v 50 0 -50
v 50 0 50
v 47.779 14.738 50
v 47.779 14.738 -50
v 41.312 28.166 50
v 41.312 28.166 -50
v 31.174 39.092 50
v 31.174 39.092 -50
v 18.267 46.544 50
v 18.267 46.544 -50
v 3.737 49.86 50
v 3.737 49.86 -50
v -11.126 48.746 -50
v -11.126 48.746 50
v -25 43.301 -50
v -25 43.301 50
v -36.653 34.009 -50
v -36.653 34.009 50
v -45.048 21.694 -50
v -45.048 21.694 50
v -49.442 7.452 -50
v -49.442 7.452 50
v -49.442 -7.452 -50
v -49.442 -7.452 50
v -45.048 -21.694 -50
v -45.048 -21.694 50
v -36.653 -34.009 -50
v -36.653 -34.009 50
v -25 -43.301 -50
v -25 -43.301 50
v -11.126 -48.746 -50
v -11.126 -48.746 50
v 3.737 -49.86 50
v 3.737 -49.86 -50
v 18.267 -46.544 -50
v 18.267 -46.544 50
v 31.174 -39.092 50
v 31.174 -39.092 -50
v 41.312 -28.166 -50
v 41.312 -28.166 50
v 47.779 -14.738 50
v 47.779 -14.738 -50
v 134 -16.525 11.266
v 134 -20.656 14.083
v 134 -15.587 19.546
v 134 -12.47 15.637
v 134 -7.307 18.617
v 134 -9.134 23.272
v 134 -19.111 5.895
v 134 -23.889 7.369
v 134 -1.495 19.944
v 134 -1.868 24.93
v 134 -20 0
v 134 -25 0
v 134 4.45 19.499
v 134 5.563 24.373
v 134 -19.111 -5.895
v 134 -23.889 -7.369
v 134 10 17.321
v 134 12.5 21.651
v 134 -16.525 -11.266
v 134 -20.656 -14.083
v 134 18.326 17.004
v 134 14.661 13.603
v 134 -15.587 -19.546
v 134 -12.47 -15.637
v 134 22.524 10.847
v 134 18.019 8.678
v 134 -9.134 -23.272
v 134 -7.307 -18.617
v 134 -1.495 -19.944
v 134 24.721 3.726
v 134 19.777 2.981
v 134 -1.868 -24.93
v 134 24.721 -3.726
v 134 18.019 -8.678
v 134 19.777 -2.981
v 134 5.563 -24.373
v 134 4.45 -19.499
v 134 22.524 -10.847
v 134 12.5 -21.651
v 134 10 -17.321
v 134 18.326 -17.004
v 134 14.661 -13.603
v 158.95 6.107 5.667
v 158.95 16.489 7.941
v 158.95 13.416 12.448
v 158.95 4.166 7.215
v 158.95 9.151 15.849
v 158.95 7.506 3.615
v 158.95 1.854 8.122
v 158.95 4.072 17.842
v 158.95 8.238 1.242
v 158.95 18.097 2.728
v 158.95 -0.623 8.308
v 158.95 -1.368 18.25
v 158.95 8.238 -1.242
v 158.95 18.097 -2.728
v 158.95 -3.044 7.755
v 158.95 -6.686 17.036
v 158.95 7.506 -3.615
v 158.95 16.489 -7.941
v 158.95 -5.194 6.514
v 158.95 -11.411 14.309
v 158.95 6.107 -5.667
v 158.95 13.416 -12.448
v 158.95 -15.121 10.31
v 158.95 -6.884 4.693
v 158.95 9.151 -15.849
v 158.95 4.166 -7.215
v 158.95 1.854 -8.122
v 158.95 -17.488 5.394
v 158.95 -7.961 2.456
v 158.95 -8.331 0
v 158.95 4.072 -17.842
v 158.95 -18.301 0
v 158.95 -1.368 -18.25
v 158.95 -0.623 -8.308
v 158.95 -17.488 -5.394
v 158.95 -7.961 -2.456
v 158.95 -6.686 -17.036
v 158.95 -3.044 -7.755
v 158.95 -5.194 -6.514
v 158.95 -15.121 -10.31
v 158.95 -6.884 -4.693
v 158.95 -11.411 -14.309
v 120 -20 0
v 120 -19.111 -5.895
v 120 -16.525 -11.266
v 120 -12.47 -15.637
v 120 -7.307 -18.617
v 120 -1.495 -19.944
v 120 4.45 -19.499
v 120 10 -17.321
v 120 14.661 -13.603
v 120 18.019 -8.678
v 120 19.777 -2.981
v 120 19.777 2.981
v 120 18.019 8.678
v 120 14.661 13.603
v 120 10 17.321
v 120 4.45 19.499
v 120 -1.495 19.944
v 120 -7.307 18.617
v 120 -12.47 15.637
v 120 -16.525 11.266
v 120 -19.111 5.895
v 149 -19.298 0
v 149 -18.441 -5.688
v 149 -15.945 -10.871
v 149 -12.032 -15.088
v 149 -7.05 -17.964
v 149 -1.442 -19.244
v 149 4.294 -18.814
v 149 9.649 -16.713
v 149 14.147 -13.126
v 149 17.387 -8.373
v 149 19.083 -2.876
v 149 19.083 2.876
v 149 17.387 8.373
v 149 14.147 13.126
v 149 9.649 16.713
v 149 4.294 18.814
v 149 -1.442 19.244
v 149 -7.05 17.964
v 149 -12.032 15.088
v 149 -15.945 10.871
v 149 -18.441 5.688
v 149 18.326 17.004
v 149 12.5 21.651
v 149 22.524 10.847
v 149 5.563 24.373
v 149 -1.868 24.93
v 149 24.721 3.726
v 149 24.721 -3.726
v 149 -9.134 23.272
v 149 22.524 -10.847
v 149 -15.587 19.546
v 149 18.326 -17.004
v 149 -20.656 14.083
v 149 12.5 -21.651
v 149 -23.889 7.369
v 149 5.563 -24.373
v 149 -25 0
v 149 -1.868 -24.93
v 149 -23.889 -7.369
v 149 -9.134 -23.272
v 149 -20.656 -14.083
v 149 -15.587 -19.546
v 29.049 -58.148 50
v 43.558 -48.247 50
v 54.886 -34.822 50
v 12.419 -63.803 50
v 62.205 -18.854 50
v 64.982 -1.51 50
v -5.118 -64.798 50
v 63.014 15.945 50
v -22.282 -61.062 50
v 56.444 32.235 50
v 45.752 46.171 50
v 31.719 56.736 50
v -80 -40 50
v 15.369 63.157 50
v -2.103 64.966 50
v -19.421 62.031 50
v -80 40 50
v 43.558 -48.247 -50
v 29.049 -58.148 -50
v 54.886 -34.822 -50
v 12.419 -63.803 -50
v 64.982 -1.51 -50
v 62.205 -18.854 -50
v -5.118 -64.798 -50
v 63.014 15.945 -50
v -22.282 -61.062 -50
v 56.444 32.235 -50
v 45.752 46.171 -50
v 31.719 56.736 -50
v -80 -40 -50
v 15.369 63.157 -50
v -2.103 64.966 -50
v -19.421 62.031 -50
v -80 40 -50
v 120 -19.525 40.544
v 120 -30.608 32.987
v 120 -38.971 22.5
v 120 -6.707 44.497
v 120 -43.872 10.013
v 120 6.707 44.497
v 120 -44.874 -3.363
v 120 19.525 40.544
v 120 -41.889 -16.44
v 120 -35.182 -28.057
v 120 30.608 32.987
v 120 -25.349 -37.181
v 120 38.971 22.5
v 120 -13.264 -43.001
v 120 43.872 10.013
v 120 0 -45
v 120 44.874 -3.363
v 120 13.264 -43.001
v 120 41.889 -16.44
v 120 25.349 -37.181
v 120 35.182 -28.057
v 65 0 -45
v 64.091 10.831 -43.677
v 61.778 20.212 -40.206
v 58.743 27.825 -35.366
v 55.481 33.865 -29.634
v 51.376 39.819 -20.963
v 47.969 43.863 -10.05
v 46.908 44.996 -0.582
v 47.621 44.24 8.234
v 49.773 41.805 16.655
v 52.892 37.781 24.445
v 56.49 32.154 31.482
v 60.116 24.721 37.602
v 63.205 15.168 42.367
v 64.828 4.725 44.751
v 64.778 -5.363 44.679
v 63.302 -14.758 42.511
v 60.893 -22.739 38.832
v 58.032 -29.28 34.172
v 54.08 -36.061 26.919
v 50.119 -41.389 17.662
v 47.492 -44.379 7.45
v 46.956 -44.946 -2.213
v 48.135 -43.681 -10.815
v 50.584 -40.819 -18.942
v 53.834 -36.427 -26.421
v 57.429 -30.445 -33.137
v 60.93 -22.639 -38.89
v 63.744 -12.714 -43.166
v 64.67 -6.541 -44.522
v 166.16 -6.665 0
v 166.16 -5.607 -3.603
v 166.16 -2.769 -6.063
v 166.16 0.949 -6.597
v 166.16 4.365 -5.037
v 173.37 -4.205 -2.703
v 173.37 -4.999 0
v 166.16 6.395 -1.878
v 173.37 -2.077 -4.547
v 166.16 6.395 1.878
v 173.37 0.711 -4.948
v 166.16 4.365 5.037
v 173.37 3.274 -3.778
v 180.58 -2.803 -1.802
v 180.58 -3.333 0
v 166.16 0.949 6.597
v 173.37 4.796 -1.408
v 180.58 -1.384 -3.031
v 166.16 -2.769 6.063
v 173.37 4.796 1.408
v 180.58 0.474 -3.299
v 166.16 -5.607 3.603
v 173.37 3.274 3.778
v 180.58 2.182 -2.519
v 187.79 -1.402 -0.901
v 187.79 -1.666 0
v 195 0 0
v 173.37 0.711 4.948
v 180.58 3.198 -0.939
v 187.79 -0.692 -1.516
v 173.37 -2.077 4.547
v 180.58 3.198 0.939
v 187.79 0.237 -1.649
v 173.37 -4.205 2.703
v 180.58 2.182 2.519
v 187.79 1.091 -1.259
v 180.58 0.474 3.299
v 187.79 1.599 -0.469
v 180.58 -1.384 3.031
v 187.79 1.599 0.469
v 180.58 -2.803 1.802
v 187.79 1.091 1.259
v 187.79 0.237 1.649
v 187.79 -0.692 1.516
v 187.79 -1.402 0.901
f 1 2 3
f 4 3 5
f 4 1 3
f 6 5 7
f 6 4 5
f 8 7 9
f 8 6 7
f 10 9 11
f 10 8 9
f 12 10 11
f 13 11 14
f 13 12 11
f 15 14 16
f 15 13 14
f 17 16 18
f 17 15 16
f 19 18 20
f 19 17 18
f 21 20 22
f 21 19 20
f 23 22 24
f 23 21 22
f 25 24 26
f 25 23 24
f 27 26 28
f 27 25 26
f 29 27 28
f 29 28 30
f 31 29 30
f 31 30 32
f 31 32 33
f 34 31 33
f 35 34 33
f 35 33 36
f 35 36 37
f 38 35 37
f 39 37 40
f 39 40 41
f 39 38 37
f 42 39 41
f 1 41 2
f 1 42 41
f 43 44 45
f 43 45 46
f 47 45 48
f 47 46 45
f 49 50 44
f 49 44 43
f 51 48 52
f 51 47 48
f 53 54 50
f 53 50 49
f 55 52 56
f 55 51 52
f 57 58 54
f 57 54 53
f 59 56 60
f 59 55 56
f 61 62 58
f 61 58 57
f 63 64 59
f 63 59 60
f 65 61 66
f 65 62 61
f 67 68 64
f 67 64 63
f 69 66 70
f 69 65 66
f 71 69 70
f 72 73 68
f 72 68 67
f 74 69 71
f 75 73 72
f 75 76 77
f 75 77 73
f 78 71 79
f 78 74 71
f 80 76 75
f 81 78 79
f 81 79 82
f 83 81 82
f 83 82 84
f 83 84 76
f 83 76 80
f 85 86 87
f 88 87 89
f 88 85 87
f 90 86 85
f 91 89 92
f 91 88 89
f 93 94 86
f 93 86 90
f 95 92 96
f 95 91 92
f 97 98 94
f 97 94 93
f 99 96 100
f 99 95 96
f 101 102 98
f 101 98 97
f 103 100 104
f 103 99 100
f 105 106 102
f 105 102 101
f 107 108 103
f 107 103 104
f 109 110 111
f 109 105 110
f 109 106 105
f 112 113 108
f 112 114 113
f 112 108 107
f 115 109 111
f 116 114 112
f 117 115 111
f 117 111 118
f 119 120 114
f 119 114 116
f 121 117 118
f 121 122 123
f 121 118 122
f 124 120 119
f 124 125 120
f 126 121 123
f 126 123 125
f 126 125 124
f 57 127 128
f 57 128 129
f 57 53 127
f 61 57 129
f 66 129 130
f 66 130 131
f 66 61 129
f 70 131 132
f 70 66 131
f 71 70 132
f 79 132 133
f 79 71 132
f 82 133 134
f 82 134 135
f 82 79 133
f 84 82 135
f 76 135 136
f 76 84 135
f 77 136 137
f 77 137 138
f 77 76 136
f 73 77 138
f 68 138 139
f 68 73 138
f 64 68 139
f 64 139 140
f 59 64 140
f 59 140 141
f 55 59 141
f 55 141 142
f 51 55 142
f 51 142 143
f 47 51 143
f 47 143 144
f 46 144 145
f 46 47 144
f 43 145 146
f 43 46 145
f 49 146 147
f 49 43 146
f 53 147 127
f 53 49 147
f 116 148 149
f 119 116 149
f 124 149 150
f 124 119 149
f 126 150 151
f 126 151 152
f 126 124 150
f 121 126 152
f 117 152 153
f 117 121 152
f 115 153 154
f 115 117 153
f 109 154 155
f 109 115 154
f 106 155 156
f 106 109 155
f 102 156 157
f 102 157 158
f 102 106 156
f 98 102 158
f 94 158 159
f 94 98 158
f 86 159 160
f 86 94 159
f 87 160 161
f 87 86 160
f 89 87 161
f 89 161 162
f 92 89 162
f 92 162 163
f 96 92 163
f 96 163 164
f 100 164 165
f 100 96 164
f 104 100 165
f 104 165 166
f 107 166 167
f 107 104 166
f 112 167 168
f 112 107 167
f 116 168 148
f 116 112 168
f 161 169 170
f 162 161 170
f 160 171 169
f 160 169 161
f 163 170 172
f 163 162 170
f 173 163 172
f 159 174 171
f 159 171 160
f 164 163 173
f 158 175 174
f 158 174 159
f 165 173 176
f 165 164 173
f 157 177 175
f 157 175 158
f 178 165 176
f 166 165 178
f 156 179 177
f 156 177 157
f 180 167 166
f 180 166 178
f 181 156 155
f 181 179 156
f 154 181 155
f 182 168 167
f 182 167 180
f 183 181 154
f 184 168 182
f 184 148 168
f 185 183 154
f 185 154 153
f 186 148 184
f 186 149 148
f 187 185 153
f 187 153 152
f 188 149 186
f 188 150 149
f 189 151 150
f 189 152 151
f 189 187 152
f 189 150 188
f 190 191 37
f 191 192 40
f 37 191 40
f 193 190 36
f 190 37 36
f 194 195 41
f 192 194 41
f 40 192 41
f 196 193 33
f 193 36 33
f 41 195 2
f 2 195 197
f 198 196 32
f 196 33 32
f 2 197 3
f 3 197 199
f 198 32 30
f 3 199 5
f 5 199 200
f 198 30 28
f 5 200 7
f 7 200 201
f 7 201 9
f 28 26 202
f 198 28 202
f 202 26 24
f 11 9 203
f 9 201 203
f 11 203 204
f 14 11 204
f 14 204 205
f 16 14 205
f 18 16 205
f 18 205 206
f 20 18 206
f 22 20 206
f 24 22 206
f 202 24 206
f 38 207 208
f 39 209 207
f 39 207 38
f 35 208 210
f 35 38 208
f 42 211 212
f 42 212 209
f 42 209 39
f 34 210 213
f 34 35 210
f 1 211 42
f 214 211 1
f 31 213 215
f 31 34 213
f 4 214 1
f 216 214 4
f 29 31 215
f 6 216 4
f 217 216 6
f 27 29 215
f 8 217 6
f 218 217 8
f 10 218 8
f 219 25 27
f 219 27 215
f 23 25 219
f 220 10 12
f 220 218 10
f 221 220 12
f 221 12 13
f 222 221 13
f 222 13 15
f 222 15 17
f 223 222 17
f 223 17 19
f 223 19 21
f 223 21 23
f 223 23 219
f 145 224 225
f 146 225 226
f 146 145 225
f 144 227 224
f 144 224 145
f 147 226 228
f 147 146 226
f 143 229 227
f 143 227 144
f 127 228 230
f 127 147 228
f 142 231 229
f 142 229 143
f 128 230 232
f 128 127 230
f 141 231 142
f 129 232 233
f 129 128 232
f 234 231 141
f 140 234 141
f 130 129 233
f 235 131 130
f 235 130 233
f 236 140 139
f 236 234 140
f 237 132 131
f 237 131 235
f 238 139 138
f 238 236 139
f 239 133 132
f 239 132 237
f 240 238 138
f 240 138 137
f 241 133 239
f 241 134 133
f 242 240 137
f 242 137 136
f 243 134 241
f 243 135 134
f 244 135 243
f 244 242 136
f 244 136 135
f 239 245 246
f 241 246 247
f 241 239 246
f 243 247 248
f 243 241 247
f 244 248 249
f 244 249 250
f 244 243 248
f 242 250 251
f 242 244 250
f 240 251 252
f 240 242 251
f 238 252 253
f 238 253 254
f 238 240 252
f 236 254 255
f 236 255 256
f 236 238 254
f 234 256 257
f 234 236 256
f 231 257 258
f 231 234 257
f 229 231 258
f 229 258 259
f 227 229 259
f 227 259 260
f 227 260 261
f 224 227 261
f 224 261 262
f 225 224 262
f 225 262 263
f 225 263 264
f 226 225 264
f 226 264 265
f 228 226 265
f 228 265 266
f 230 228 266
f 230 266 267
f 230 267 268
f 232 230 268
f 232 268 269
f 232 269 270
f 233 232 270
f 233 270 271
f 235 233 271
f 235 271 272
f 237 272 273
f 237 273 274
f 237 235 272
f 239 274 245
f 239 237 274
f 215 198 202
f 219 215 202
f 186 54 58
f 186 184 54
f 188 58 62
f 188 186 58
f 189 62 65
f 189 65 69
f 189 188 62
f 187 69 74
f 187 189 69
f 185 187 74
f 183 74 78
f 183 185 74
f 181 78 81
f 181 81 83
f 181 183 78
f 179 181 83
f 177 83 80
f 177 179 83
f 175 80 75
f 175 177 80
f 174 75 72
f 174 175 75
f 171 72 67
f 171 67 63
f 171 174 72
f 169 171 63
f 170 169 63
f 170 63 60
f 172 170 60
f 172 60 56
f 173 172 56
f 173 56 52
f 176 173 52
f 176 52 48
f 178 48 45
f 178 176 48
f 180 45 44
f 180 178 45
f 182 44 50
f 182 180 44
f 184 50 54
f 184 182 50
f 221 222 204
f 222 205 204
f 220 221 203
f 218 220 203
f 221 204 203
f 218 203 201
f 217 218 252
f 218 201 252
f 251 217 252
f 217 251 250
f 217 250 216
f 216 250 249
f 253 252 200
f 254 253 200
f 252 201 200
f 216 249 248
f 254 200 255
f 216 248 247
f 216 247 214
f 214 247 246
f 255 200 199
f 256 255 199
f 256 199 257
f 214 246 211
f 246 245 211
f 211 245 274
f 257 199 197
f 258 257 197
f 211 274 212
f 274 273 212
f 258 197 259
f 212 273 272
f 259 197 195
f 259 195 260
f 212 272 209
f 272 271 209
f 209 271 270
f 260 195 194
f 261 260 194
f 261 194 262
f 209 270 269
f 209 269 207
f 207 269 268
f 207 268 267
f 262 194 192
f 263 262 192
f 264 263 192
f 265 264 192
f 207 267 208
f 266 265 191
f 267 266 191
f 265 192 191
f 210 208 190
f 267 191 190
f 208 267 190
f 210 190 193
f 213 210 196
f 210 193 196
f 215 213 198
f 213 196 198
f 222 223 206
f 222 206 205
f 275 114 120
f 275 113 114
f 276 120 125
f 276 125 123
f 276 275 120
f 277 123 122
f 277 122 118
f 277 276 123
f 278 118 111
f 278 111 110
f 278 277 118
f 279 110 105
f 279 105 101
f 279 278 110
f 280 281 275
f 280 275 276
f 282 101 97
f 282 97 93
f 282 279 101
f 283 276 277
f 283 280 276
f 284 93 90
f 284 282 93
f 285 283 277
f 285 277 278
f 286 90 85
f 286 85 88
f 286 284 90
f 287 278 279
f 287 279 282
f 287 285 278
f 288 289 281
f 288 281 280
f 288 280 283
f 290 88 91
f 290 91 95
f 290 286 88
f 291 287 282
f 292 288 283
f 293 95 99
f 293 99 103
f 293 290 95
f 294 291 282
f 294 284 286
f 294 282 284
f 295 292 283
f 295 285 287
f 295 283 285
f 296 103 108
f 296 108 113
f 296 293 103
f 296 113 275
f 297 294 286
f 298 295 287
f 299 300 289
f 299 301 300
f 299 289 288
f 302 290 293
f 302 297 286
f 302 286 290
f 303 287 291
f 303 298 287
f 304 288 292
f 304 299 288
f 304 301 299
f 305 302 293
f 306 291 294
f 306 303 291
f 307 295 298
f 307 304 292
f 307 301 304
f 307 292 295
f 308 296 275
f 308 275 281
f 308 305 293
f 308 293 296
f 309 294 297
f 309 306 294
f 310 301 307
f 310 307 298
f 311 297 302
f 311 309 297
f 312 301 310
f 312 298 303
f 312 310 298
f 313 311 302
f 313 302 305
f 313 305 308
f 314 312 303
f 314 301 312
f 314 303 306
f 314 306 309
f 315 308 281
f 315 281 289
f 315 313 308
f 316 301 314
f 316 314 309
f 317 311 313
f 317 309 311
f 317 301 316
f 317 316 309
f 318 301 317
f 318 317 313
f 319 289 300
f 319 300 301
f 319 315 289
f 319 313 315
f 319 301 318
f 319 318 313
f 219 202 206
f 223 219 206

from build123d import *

# Parameters (mm, degrees)
SKETCH1_R           = 50
BOSS_EXTRUDE1_DEPTH = 50
BOSS_EXTRUDE2_REACH = 202
SKETCH2_R           = 45


with BuildPart() as part:
    # Sketch1 → Boss-Extrude1 (new body, symmetric)
    with BuildSketch(Plane.XY):
        with BuildLine():
            Line((-80, -40), (-80, 40))
            Line((-80, 40), (-19.421277332, 62.030750332))
            ThreePointArc((-19.421277332, 62.030750332), (64.982457362, -1.51004478), (-22.281665693, -61.061668614))
            Line((-22.281665693, -61.061668614), (-80, -40))
        make_face()
        Circle(SKETCH1_R, mode=Mode.SUBTRACT)
    extrude(amount=BOSS_EXTRUDE1_DEPTH, both=True)

    # Sketch2 → Boss-Extrude2 (add, up to next)
    with BuildSketch(Plane(origin=(120, 0, 0), x_dir=(0, 0, -1), z_dir=(1, 0, 0)), mode=Mode.PRIVATE) as boss_extrude2_sk1:
        Circle(SKETCH2_R)
    boss_extrude2_tool1 = extrude(boss_extrude2_sk1.sketch, amount=-BOSS_EXTRUDE2_REACH, mode=Mode.PRIVATE) - part.part
    add(boss_extrude2_tool1.solids().sort_by_distance((120, 0, 0))[0])

    # Sketch3 → Revolve1 (revolve)
    with BuildSketch(Plane.XY):
        Polygon((120, 0), (120, -20), (134, -20), (134, -25), (149, -25), (149, -19.298257311), (158.95018422, -18.301345082), (158.95018422, -8.331313354), (195, 0), align=None)
    revolve(axis=Axis((0, 0, 0), (1, 0, 0)))


solid = part.part
